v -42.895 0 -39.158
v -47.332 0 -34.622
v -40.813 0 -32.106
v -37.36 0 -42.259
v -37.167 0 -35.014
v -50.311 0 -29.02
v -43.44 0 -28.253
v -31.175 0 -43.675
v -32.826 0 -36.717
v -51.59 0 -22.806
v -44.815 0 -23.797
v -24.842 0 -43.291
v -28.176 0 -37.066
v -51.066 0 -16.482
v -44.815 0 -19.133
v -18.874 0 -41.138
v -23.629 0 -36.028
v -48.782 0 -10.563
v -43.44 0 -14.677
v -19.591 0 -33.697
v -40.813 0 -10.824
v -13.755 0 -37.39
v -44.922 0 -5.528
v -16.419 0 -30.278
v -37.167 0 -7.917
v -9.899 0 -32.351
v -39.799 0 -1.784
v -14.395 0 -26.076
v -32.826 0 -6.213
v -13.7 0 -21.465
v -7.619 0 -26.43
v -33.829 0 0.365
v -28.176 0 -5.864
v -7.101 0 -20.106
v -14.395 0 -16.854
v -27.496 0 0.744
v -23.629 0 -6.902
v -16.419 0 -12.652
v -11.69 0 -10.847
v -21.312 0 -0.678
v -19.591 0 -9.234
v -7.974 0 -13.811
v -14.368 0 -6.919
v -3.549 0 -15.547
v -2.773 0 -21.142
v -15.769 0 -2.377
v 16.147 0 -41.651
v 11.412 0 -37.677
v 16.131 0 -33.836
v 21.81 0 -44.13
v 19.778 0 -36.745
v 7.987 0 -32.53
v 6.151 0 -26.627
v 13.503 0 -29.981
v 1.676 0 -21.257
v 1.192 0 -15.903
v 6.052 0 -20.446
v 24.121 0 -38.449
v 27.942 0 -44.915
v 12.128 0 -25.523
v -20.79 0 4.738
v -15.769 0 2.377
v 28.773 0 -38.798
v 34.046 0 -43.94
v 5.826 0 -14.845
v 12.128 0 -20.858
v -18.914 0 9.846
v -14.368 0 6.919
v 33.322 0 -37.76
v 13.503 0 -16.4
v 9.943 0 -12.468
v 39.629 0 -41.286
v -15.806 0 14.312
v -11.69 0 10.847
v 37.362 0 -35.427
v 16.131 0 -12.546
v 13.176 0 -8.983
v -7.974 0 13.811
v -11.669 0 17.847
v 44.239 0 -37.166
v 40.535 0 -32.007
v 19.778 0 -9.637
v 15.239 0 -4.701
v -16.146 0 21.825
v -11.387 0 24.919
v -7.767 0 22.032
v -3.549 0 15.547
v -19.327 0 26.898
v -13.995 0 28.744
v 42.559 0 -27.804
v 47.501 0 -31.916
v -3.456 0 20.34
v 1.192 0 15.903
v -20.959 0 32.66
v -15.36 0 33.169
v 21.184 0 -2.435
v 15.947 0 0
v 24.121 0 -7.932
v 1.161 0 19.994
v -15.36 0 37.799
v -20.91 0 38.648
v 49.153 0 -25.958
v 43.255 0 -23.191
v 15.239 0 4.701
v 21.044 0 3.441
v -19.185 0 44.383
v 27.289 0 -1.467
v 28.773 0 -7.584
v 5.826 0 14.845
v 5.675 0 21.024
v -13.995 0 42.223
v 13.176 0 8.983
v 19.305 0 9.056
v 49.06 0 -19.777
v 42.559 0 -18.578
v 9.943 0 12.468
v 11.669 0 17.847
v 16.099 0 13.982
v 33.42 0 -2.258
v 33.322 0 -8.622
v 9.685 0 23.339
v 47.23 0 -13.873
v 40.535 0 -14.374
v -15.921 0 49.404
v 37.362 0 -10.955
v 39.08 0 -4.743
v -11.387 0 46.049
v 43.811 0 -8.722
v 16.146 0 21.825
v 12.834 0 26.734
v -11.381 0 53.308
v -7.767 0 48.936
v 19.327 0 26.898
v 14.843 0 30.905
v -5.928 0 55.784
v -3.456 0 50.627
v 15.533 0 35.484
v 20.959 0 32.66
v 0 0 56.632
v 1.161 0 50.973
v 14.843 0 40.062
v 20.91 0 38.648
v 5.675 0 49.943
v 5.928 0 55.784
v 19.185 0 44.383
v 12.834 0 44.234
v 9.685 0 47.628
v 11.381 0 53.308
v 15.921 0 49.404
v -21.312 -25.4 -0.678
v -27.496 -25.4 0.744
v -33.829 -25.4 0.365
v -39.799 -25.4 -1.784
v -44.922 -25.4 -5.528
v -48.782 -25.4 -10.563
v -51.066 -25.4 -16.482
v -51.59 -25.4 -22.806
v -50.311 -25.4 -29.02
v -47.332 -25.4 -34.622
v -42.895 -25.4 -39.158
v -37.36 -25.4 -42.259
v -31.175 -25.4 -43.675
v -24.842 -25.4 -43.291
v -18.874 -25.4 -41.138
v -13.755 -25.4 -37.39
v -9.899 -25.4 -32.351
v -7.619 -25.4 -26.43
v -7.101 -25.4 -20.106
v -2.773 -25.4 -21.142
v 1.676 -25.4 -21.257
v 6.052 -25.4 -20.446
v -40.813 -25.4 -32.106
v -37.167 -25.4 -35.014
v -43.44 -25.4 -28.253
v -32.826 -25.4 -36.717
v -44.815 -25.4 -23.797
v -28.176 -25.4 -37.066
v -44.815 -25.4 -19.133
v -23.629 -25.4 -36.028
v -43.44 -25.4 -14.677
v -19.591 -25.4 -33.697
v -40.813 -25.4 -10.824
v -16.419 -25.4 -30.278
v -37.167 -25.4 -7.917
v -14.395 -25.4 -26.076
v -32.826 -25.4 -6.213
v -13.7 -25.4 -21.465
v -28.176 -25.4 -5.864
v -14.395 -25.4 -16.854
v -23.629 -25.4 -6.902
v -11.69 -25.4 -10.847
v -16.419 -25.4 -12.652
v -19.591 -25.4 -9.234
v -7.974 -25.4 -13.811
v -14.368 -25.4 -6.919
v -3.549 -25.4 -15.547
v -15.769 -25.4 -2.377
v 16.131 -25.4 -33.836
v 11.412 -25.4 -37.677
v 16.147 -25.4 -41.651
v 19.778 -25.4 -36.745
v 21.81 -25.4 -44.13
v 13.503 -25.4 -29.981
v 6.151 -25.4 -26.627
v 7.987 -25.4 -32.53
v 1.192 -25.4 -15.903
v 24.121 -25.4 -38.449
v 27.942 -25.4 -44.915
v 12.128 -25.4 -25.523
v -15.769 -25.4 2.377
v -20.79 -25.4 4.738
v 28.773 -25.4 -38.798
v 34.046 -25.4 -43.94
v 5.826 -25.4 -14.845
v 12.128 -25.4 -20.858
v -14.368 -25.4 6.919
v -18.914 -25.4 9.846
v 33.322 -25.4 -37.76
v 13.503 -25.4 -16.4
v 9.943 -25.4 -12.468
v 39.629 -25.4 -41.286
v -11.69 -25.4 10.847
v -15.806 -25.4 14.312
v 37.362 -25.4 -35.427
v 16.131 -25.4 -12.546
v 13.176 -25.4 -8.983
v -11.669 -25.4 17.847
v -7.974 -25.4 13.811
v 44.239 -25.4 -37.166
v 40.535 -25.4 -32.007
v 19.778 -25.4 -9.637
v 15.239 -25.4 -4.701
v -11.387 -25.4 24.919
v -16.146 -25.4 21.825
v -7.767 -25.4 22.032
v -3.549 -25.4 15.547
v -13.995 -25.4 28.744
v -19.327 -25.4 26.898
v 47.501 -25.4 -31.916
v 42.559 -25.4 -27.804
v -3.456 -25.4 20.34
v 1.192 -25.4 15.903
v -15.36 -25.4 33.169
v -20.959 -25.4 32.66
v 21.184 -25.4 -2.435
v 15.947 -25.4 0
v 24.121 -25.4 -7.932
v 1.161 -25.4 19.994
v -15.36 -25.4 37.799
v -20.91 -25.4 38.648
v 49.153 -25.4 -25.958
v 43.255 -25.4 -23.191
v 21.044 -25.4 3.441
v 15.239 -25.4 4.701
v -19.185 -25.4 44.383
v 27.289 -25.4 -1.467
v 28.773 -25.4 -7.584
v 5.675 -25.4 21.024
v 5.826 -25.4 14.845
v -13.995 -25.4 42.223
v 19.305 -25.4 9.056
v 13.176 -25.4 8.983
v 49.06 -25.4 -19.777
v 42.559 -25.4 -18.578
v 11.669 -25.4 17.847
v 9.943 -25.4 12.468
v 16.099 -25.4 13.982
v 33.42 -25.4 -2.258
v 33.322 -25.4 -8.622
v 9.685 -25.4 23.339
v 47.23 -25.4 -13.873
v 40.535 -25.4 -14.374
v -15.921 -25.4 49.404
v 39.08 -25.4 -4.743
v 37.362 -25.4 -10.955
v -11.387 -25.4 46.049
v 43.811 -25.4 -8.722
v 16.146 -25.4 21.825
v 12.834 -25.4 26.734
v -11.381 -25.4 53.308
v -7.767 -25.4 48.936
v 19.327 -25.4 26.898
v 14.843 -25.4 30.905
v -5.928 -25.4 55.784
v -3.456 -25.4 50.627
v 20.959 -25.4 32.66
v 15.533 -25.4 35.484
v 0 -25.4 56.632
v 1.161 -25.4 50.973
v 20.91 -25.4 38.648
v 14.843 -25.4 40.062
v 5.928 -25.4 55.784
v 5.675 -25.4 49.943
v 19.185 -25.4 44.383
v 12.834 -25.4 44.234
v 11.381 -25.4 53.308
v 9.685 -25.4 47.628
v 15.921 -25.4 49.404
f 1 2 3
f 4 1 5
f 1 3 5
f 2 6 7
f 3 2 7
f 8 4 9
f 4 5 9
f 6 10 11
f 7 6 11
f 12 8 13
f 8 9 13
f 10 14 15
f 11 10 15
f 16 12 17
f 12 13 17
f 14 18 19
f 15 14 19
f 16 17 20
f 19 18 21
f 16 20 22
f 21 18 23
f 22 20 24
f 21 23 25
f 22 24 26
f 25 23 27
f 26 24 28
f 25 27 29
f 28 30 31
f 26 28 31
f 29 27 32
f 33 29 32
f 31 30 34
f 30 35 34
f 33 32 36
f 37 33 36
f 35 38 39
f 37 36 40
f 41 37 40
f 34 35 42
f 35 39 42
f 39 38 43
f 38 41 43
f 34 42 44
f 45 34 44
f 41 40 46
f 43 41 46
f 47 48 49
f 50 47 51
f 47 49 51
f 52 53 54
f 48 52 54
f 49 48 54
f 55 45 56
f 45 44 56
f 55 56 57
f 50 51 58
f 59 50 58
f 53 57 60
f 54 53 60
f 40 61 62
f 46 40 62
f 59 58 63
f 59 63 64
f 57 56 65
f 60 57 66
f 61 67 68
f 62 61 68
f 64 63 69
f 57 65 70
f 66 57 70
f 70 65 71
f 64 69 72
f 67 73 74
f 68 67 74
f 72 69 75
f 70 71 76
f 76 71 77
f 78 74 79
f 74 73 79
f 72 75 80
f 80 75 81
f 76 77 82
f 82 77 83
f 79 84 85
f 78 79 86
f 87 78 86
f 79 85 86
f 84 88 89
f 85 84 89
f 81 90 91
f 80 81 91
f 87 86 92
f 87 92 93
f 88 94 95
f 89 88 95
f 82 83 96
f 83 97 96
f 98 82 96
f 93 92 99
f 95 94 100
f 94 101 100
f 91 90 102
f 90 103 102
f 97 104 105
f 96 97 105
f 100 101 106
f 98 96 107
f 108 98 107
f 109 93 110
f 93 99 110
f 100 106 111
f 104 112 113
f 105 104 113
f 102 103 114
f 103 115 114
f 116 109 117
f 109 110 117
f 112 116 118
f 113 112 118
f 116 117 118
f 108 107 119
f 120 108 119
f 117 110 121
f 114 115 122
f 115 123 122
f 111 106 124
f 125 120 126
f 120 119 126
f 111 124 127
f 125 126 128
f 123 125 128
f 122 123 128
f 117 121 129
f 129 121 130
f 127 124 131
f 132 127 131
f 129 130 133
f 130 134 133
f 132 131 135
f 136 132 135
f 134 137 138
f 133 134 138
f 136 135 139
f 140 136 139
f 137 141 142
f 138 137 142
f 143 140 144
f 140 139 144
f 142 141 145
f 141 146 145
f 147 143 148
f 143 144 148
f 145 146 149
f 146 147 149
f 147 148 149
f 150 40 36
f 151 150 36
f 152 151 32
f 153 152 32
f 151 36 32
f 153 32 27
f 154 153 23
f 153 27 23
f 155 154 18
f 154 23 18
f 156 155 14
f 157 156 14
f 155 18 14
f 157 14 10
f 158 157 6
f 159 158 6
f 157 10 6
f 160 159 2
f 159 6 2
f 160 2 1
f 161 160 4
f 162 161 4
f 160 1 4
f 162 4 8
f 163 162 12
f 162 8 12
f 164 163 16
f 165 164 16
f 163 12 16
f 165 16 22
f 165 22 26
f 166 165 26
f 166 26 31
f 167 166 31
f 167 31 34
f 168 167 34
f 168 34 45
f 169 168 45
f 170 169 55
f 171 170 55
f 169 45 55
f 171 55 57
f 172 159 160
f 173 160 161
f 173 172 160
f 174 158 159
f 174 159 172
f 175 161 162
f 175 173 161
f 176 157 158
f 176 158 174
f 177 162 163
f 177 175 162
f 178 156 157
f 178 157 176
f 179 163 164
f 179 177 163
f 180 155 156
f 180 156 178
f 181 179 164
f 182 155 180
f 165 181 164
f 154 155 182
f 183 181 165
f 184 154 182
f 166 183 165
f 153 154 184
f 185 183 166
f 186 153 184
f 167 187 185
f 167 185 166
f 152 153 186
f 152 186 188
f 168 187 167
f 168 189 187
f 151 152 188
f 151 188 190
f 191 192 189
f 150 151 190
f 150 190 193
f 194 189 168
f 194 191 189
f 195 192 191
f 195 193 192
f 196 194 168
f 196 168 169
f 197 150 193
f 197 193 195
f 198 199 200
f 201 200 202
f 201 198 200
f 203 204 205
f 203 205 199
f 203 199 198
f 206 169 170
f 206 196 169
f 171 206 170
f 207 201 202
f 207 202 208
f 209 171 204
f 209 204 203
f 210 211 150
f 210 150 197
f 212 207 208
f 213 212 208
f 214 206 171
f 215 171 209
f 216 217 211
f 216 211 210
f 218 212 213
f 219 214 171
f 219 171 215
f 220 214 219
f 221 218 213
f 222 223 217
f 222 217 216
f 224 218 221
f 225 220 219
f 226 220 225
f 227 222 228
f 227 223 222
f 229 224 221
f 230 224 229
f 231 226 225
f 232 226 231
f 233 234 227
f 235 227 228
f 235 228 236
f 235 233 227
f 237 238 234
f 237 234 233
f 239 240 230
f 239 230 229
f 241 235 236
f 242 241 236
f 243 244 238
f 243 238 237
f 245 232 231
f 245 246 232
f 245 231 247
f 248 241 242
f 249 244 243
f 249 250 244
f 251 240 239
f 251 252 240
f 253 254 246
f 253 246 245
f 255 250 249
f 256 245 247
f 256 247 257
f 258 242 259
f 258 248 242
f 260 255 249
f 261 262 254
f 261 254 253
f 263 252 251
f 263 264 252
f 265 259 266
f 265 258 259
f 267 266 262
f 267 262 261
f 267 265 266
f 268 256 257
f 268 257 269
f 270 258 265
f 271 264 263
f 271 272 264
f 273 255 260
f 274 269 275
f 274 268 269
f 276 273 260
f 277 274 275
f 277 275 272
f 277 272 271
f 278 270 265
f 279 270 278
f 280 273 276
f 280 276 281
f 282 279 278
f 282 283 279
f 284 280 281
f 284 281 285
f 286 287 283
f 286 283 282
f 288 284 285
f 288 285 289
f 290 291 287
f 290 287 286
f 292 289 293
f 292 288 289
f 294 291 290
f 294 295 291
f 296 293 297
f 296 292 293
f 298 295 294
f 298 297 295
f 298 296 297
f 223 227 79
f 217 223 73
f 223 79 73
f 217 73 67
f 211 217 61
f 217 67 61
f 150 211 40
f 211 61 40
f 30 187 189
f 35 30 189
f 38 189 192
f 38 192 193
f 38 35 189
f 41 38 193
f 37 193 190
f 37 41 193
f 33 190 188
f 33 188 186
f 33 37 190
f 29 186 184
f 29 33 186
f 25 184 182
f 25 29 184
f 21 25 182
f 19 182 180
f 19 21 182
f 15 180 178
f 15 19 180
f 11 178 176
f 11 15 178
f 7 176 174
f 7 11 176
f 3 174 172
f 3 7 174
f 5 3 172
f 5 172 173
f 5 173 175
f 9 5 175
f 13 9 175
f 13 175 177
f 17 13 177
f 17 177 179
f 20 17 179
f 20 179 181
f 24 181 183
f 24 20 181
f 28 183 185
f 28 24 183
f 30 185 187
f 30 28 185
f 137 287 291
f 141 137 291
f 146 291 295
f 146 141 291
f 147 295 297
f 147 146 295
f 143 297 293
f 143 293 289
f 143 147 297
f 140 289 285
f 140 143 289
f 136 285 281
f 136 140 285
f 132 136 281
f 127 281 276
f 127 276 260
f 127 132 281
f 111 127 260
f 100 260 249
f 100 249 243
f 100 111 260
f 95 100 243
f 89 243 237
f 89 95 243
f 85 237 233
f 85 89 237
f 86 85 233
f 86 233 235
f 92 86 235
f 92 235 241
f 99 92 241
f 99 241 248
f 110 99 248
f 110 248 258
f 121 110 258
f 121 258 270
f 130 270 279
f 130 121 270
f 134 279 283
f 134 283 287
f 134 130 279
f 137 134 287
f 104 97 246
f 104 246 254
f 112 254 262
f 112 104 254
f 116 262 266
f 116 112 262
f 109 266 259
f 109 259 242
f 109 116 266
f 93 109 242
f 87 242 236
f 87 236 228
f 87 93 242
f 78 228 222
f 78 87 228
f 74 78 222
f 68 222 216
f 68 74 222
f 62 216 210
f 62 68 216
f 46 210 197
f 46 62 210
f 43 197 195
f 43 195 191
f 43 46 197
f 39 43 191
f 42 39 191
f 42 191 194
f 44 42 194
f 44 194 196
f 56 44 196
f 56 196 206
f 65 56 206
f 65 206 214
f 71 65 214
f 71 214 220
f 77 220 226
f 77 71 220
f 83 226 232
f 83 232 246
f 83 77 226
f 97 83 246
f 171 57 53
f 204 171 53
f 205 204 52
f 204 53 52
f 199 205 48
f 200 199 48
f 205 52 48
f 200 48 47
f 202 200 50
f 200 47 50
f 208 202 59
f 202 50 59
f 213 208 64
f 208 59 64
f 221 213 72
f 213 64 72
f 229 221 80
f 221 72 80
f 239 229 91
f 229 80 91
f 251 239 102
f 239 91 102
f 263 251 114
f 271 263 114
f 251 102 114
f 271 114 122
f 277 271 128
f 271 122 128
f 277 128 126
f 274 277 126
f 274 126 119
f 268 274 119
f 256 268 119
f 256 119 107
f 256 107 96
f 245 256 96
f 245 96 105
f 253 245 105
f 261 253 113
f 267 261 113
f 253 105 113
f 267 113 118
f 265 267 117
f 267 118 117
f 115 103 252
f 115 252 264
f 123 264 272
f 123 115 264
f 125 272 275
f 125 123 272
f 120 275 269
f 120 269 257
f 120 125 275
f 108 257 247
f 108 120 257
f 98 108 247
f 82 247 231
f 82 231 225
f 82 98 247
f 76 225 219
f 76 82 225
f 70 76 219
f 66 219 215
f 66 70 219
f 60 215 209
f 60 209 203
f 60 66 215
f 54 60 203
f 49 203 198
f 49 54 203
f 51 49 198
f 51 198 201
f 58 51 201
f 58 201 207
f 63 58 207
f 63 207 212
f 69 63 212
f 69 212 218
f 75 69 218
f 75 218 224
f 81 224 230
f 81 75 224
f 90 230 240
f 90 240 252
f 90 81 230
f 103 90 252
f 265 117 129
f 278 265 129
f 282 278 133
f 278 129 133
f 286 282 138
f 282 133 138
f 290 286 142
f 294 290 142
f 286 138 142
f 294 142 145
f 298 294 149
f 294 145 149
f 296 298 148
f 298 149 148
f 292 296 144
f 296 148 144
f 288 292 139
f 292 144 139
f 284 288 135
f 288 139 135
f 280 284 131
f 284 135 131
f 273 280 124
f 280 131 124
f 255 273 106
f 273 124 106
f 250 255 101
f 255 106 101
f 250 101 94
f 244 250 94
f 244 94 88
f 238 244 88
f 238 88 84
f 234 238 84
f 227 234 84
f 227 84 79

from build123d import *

# Parameters (mm, degrees)
F0_R     = 15.644547
F0_R_2   = 15.650853
F0_R_3   = 15.947198
F0_R_4   = 15.533086
F1_DEPTH = 25.4


with BuildPart() as f1:
    # F0 (on Front) → F1 (new body)
    with BuildSketch(Plane.XZ):
        with BuildLine():
            ThreePointArc((11.669454, 17.846526), (0, 56.631885), (-11.669454, 17.846526))
            ThreePointArc((-11.669454, 17.846526), (-18.913895, 9.845772), (-21.312332, -0.677605))
            ThreePointArc((-21.312332, -0.677605), (-47.332079, -34.622215), (-7.100958, -20.105995))
            ThreePointArc((-7.100958, -20.105995), (-0.551606, -21.315965), (6.05156, -20.446351))
            ThreePointArc((6.05156, -20.446351), (44.238676, -37.166309), (21.183635, -2.434797))
            ThreePointArc((21.183635, -2.434797), (19.304517, 9.055951), (11.669454, 17.846526))
        make_face()
        with Locations((-29.344995, -21.465119)):
            Circle(F0_R, mode=Mode.SUBTRACT)
        with Locations((27.60382, -23.190841)):
            Circle(F0_R_2, mode=Mode.SUBTRACT)
        Circle(F0_R_3, mode=Mode.SUBTRACT)
        with Locations((0, 35.483696)):
            Circle(F0_R_4, mode=Mode.SUBTRACT)
    extrude(amount=F1_DEPTH)


solid = f1.part
